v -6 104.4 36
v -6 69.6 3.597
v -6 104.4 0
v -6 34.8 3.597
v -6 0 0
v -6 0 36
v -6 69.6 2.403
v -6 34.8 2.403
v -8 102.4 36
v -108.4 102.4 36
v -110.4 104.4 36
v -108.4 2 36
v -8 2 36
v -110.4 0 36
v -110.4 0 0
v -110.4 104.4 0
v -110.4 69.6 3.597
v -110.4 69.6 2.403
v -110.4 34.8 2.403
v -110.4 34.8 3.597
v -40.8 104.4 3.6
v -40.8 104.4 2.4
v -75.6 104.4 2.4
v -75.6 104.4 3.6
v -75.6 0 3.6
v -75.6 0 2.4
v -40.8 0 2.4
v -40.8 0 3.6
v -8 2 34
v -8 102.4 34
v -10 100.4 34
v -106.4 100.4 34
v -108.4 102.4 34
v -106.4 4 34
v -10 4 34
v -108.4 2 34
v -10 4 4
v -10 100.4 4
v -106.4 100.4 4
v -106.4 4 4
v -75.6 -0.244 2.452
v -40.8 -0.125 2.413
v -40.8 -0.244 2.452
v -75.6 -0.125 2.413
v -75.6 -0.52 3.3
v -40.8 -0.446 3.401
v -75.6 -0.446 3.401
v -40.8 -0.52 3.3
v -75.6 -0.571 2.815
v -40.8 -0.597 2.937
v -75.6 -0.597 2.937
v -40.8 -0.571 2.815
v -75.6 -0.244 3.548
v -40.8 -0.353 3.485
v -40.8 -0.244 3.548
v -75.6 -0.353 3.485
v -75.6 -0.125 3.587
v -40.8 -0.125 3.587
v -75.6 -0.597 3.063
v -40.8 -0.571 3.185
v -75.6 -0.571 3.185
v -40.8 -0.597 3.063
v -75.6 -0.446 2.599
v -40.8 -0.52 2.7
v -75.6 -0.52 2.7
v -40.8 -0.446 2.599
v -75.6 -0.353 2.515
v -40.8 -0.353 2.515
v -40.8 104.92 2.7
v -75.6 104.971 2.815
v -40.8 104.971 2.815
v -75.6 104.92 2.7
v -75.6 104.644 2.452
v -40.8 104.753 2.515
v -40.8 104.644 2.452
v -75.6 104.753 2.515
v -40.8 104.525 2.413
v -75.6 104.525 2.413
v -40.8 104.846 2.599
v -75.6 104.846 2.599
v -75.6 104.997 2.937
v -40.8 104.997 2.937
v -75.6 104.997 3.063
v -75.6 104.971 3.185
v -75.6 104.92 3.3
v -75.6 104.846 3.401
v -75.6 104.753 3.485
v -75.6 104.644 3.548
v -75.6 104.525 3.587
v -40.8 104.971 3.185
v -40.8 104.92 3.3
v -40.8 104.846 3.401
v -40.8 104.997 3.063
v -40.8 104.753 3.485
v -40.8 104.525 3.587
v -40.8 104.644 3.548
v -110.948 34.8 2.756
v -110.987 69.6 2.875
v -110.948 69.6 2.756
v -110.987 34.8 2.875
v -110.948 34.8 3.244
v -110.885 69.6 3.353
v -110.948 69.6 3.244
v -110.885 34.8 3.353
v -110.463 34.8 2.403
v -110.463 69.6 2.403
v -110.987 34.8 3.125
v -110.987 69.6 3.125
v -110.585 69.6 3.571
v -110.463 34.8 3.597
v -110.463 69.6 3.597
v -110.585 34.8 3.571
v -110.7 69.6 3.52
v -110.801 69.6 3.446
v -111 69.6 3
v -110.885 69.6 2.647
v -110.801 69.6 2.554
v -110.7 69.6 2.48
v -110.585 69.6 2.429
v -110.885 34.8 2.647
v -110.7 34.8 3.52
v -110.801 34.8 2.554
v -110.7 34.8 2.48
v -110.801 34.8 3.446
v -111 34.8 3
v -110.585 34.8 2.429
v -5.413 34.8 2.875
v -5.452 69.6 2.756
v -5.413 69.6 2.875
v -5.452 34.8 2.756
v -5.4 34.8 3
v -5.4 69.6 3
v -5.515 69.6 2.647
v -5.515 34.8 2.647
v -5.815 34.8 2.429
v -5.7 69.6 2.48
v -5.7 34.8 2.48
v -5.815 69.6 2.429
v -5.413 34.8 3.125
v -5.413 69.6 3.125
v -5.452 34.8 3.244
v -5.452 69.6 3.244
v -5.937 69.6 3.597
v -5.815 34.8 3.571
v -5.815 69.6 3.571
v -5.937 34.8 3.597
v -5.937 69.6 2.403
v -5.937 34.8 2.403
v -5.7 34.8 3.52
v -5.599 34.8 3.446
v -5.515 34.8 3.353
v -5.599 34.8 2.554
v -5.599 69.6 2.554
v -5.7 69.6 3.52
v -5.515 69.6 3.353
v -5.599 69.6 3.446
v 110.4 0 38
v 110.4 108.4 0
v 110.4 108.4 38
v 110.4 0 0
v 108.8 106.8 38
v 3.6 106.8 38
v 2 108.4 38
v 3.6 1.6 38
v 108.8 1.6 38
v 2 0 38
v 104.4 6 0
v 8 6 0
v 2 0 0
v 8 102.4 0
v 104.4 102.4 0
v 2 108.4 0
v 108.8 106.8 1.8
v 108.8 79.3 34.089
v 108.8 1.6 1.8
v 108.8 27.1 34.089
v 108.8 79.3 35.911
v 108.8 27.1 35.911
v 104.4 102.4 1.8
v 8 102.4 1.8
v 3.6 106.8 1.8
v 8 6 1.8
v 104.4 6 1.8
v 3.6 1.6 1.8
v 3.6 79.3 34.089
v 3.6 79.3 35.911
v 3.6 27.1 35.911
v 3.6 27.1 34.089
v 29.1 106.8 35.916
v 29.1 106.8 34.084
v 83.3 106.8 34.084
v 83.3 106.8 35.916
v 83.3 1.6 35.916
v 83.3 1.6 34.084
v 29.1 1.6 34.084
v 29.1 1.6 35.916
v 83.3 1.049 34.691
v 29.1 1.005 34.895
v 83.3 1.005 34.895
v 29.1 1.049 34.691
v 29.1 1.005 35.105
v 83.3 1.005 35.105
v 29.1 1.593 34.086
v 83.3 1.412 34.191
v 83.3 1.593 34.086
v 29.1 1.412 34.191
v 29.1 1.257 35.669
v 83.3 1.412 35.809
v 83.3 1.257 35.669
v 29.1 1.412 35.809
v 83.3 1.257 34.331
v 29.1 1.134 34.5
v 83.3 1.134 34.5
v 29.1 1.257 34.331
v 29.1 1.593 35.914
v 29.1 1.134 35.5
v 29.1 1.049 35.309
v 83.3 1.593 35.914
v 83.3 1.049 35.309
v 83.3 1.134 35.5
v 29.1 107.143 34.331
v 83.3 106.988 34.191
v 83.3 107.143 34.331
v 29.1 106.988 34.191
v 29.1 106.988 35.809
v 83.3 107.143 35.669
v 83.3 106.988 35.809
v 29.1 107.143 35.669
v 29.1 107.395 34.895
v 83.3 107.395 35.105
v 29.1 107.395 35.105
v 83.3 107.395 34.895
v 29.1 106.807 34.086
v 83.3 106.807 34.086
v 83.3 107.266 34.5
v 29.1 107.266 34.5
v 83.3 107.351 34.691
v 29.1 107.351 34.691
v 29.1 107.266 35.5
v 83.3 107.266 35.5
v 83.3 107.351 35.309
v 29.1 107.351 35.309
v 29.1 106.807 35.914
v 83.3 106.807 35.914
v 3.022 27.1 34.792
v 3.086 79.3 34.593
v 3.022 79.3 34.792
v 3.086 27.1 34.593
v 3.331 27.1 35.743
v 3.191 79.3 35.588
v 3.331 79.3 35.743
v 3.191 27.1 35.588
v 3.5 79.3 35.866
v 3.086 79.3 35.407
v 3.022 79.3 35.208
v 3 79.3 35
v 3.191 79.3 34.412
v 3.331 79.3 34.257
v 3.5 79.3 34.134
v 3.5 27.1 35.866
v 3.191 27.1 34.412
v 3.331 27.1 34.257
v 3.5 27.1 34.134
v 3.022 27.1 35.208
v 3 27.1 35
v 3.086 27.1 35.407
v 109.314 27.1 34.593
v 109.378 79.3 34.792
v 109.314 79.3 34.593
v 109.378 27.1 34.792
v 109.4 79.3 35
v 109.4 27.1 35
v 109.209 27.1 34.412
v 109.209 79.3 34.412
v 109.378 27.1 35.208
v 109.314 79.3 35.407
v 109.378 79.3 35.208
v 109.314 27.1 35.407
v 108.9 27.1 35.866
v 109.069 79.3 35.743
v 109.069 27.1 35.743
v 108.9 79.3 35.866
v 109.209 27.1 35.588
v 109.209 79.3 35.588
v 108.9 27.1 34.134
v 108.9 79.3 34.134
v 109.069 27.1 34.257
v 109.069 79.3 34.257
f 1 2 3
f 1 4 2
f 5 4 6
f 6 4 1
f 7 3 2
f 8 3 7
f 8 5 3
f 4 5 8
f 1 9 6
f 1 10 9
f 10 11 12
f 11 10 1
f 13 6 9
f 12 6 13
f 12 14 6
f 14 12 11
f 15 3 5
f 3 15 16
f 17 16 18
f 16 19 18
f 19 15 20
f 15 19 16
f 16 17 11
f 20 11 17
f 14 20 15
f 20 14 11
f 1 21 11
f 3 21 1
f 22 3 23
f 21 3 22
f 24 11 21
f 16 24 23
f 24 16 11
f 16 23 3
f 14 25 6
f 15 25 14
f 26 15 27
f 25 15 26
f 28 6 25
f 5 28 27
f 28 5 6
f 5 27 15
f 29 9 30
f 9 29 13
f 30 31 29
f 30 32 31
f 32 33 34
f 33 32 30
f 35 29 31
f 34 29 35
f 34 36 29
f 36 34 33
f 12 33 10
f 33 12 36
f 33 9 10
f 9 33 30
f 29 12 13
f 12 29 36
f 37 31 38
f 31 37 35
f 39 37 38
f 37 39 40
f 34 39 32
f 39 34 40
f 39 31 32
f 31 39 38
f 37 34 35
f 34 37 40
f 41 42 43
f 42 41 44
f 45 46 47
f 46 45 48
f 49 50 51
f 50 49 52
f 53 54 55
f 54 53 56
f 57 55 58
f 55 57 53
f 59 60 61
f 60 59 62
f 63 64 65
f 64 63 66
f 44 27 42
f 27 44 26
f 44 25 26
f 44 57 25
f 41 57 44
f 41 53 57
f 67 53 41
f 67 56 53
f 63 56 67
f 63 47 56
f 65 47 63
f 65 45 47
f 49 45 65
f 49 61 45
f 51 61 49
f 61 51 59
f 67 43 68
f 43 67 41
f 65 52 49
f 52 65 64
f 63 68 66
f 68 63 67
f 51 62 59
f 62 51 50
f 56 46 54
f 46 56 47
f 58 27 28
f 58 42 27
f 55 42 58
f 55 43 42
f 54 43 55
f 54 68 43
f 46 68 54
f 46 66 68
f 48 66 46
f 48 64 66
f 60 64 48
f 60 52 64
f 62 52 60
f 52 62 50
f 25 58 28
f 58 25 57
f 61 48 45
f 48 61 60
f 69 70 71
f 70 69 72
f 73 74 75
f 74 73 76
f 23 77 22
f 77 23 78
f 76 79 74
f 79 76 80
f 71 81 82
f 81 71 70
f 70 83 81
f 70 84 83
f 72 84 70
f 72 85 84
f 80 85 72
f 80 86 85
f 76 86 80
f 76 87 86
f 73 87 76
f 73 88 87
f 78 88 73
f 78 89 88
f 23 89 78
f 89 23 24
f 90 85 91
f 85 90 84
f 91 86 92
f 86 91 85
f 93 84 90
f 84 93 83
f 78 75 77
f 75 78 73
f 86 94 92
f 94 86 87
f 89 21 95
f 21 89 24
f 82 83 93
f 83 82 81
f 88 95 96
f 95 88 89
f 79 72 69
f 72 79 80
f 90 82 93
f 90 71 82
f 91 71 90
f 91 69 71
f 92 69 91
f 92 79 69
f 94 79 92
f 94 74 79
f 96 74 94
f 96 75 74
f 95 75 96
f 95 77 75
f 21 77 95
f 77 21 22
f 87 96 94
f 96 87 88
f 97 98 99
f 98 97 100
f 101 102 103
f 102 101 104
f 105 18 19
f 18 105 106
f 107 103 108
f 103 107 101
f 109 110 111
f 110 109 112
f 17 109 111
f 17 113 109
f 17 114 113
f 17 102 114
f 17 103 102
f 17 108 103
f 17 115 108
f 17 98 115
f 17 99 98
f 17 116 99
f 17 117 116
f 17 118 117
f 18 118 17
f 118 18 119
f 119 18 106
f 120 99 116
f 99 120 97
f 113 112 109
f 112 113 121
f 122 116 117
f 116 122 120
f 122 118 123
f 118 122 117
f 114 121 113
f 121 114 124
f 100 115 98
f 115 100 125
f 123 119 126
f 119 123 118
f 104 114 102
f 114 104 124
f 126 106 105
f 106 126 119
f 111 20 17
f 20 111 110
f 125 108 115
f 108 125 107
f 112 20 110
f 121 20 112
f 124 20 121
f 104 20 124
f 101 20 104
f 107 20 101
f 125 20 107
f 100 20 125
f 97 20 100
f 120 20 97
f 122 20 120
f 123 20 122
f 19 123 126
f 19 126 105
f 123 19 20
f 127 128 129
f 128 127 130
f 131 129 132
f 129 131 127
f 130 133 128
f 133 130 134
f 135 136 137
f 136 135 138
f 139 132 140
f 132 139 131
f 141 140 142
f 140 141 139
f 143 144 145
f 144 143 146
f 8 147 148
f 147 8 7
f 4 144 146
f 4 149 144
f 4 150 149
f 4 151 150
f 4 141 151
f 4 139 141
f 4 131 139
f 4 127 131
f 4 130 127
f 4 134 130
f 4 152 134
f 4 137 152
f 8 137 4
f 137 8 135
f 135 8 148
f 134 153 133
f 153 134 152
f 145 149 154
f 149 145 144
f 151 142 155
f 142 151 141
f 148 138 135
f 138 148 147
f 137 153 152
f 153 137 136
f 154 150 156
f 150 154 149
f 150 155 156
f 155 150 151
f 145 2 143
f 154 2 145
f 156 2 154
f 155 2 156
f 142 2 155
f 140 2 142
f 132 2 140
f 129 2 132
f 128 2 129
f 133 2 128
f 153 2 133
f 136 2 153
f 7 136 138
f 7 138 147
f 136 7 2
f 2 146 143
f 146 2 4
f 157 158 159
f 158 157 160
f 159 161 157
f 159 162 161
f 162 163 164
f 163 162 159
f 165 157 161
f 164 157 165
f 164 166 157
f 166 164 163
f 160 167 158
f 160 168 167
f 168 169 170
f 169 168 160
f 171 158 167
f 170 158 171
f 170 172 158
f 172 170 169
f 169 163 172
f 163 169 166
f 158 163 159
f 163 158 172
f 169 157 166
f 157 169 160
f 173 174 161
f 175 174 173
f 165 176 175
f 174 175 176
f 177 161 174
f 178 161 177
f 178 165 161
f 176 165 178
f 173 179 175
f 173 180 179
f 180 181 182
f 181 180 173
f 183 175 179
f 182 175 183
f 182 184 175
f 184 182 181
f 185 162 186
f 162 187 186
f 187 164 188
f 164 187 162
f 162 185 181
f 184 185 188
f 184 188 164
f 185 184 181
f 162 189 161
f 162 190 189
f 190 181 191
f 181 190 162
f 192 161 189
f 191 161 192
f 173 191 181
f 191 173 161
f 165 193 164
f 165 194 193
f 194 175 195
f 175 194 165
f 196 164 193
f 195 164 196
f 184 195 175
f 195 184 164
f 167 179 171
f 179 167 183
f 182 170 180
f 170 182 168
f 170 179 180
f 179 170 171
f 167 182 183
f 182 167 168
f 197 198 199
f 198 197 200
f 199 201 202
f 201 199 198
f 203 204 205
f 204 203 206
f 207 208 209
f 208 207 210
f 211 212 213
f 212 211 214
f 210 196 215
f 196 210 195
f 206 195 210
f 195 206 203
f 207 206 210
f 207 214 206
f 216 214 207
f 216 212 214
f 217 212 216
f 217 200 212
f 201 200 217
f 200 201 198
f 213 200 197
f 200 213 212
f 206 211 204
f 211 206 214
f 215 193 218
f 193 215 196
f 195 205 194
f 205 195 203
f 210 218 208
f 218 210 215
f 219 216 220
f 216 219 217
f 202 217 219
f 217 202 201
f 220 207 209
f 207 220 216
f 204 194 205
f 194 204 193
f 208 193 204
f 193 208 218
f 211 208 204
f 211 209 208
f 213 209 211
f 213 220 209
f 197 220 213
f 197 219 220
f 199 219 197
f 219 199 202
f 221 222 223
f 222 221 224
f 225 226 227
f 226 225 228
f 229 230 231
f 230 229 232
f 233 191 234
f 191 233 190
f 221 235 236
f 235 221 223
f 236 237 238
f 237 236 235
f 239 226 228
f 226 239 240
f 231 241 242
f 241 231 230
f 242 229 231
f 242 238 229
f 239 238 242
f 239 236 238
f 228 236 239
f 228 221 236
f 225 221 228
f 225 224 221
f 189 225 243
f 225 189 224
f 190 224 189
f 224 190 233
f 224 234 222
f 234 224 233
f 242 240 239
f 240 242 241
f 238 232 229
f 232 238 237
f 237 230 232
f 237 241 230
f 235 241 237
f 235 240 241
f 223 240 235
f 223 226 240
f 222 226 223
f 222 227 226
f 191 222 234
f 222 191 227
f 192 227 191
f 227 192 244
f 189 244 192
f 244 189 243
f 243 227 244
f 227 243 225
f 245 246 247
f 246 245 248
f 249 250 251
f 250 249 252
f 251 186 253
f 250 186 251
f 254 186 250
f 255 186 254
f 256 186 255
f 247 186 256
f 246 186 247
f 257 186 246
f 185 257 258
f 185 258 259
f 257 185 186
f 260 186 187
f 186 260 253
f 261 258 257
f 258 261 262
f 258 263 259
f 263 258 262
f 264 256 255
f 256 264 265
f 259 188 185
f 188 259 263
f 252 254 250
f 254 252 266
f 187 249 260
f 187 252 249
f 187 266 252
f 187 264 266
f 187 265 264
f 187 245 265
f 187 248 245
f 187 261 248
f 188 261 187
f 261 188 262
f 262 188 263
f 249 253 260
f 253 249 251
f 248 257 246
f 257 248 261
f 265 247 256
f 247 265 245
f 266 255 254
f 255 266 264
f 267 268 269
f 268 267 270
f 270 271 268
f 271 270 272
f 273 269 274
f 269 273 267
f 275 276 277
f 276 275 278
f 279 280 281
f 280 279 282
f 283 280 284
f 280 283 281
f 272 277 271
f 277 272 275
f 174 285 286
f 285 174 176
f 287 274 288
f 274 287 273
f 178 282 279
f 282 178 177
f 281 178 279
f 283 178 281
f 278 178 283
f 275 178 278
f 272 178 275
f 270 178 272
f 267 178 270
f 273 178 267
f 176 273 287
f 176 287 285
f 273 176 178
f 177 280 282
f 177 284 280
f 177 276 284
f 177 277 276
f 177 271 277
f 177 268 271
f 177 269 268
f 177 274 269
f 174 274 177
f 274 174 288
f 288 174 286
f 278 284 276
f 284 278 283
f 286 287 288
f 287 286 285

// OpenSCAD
glassThick = 2.0;
glassHeight = 100.4;
glassWidth = 100.4;
wallThick = 4.0;
boxHeight = 32;
part = "both"; // [box:box only,lid:lid only,both:box and lid]

module box1() {
    difference() {
        cube([glassWidth+wallThick, glassHeight+wallThick, wallThick+boxHeight]);
        translate([wallThick/2, wallThick/2, boxHeight+wallThick-glassThick]) {
            cube([glassWidth, glassHeight, glassThick+1]);
        }
        translate([wallThick, wallThick, wallThick]) {
            cube([glassWidth-wallThick, glassHeight-wallThick, boxHeight+1]);
        }
    }
    
    translate([(glassWidth+wallThick)/3,0,3]) {
        rotate([0,90,0]) {
            cylinder(r=0.6, h=(glassWidth+wallThick)/3, $fn=30);
        }
    }
    translate([(glassWidth+wallThick)/3,glassHeight+wallThick,3]) {
        rotate([0,90,0]) {
            cylinder(r=0.6, h=(glassWidth+wallThick)/3, $fn=30);
        }
    }
    translate([0,(glassHeight+wallThick)/3,3]) {
        rotate([-90,0,0]) {
            cylinder(r=0.6, h=(glassHeight+wallThick)/3, $fn=30);
        }
    }
    translate([glassWidth+wallThick,(glassHeight+wallThick)/3,3]) {
        rotate([-90,0,0]) {
            cylinder(r=0.6, h=(glassWidth+wallThick)/3, $fn=30);
        }
    }
}

module cover1() {
    difference() {
        cube([glassWidth+wallThick+wallThick, glassHeight+wallThick+wallThick, wallThick+boxHeight+wallThick/2]);
        translate([wallThick/2-0.4, wallThick/2-0.4, wallThick/2-0.2]) {
            cube([glassWidth+wallThick+0.4*2, glassHeight+wallThick+0.4*2, wallThick+boxHeight+wallThick/2+0.2]);
        }
        translate([wallThick/2+wallThick, wallThick/2+wallThick, -1]) {
            cube([glassWidth-wallThick, glassHeight-wallThick, wallThick+2]);
        }
        translate([(glassWidth+wallThick+wallThick)/4,wallThick/2,wallThick+boxHeight+wallThick/2-3]) {
            rotate([0,90,0]) {
                cylinder(r=0.6+0.4, h=(glassWidth+wallThick+wallThick)/2, $fn=30);
            }
        }
        translate([(glassWidth+wallThick+wallThick)/4,glassHeight+wallThick+wallThick-wallThick/2,wallThick+boxHeight+wallThick/2-3]) {
            rotate([0,90,0]) {
                cylinder(r=0.6+0.4, h=(glassWidth+wallThick+wallThick)/2, $fn=30);
            }
        }
        translate([wallThick/2,(glassHeight+wallThick+wallThick)/4,wallThick+boxHeight+wallThick/2-3]) {
            rotate([-90,0,0]) {
                cylinder(r=0.6+0.4, h=(glassHeight+wallThick)/2, $fn=30);
            }
        }
        translate([glassWidth+wallThick+wallThick-wallThick/2,(glassHeight+wallThick+wallThick)/4,wallThick+boxHeight+wallThick/2-3]) {
            rotate([-90,0,0]) {
                cylinder(r=0.6+0.4, h=(glassWidth+wallThick)/2, $fn=30);
            }
        }        
    }
    
}

if (part == "box") {
    box1();
} else if (part == "lid") {
    cover1();
} else if (part == "both") {
    translate([-glassWidth-wallThick*2-2,0,0]) {
        box1();
    }
    translate([2,0,0]) {
        cover1();
    }
}
